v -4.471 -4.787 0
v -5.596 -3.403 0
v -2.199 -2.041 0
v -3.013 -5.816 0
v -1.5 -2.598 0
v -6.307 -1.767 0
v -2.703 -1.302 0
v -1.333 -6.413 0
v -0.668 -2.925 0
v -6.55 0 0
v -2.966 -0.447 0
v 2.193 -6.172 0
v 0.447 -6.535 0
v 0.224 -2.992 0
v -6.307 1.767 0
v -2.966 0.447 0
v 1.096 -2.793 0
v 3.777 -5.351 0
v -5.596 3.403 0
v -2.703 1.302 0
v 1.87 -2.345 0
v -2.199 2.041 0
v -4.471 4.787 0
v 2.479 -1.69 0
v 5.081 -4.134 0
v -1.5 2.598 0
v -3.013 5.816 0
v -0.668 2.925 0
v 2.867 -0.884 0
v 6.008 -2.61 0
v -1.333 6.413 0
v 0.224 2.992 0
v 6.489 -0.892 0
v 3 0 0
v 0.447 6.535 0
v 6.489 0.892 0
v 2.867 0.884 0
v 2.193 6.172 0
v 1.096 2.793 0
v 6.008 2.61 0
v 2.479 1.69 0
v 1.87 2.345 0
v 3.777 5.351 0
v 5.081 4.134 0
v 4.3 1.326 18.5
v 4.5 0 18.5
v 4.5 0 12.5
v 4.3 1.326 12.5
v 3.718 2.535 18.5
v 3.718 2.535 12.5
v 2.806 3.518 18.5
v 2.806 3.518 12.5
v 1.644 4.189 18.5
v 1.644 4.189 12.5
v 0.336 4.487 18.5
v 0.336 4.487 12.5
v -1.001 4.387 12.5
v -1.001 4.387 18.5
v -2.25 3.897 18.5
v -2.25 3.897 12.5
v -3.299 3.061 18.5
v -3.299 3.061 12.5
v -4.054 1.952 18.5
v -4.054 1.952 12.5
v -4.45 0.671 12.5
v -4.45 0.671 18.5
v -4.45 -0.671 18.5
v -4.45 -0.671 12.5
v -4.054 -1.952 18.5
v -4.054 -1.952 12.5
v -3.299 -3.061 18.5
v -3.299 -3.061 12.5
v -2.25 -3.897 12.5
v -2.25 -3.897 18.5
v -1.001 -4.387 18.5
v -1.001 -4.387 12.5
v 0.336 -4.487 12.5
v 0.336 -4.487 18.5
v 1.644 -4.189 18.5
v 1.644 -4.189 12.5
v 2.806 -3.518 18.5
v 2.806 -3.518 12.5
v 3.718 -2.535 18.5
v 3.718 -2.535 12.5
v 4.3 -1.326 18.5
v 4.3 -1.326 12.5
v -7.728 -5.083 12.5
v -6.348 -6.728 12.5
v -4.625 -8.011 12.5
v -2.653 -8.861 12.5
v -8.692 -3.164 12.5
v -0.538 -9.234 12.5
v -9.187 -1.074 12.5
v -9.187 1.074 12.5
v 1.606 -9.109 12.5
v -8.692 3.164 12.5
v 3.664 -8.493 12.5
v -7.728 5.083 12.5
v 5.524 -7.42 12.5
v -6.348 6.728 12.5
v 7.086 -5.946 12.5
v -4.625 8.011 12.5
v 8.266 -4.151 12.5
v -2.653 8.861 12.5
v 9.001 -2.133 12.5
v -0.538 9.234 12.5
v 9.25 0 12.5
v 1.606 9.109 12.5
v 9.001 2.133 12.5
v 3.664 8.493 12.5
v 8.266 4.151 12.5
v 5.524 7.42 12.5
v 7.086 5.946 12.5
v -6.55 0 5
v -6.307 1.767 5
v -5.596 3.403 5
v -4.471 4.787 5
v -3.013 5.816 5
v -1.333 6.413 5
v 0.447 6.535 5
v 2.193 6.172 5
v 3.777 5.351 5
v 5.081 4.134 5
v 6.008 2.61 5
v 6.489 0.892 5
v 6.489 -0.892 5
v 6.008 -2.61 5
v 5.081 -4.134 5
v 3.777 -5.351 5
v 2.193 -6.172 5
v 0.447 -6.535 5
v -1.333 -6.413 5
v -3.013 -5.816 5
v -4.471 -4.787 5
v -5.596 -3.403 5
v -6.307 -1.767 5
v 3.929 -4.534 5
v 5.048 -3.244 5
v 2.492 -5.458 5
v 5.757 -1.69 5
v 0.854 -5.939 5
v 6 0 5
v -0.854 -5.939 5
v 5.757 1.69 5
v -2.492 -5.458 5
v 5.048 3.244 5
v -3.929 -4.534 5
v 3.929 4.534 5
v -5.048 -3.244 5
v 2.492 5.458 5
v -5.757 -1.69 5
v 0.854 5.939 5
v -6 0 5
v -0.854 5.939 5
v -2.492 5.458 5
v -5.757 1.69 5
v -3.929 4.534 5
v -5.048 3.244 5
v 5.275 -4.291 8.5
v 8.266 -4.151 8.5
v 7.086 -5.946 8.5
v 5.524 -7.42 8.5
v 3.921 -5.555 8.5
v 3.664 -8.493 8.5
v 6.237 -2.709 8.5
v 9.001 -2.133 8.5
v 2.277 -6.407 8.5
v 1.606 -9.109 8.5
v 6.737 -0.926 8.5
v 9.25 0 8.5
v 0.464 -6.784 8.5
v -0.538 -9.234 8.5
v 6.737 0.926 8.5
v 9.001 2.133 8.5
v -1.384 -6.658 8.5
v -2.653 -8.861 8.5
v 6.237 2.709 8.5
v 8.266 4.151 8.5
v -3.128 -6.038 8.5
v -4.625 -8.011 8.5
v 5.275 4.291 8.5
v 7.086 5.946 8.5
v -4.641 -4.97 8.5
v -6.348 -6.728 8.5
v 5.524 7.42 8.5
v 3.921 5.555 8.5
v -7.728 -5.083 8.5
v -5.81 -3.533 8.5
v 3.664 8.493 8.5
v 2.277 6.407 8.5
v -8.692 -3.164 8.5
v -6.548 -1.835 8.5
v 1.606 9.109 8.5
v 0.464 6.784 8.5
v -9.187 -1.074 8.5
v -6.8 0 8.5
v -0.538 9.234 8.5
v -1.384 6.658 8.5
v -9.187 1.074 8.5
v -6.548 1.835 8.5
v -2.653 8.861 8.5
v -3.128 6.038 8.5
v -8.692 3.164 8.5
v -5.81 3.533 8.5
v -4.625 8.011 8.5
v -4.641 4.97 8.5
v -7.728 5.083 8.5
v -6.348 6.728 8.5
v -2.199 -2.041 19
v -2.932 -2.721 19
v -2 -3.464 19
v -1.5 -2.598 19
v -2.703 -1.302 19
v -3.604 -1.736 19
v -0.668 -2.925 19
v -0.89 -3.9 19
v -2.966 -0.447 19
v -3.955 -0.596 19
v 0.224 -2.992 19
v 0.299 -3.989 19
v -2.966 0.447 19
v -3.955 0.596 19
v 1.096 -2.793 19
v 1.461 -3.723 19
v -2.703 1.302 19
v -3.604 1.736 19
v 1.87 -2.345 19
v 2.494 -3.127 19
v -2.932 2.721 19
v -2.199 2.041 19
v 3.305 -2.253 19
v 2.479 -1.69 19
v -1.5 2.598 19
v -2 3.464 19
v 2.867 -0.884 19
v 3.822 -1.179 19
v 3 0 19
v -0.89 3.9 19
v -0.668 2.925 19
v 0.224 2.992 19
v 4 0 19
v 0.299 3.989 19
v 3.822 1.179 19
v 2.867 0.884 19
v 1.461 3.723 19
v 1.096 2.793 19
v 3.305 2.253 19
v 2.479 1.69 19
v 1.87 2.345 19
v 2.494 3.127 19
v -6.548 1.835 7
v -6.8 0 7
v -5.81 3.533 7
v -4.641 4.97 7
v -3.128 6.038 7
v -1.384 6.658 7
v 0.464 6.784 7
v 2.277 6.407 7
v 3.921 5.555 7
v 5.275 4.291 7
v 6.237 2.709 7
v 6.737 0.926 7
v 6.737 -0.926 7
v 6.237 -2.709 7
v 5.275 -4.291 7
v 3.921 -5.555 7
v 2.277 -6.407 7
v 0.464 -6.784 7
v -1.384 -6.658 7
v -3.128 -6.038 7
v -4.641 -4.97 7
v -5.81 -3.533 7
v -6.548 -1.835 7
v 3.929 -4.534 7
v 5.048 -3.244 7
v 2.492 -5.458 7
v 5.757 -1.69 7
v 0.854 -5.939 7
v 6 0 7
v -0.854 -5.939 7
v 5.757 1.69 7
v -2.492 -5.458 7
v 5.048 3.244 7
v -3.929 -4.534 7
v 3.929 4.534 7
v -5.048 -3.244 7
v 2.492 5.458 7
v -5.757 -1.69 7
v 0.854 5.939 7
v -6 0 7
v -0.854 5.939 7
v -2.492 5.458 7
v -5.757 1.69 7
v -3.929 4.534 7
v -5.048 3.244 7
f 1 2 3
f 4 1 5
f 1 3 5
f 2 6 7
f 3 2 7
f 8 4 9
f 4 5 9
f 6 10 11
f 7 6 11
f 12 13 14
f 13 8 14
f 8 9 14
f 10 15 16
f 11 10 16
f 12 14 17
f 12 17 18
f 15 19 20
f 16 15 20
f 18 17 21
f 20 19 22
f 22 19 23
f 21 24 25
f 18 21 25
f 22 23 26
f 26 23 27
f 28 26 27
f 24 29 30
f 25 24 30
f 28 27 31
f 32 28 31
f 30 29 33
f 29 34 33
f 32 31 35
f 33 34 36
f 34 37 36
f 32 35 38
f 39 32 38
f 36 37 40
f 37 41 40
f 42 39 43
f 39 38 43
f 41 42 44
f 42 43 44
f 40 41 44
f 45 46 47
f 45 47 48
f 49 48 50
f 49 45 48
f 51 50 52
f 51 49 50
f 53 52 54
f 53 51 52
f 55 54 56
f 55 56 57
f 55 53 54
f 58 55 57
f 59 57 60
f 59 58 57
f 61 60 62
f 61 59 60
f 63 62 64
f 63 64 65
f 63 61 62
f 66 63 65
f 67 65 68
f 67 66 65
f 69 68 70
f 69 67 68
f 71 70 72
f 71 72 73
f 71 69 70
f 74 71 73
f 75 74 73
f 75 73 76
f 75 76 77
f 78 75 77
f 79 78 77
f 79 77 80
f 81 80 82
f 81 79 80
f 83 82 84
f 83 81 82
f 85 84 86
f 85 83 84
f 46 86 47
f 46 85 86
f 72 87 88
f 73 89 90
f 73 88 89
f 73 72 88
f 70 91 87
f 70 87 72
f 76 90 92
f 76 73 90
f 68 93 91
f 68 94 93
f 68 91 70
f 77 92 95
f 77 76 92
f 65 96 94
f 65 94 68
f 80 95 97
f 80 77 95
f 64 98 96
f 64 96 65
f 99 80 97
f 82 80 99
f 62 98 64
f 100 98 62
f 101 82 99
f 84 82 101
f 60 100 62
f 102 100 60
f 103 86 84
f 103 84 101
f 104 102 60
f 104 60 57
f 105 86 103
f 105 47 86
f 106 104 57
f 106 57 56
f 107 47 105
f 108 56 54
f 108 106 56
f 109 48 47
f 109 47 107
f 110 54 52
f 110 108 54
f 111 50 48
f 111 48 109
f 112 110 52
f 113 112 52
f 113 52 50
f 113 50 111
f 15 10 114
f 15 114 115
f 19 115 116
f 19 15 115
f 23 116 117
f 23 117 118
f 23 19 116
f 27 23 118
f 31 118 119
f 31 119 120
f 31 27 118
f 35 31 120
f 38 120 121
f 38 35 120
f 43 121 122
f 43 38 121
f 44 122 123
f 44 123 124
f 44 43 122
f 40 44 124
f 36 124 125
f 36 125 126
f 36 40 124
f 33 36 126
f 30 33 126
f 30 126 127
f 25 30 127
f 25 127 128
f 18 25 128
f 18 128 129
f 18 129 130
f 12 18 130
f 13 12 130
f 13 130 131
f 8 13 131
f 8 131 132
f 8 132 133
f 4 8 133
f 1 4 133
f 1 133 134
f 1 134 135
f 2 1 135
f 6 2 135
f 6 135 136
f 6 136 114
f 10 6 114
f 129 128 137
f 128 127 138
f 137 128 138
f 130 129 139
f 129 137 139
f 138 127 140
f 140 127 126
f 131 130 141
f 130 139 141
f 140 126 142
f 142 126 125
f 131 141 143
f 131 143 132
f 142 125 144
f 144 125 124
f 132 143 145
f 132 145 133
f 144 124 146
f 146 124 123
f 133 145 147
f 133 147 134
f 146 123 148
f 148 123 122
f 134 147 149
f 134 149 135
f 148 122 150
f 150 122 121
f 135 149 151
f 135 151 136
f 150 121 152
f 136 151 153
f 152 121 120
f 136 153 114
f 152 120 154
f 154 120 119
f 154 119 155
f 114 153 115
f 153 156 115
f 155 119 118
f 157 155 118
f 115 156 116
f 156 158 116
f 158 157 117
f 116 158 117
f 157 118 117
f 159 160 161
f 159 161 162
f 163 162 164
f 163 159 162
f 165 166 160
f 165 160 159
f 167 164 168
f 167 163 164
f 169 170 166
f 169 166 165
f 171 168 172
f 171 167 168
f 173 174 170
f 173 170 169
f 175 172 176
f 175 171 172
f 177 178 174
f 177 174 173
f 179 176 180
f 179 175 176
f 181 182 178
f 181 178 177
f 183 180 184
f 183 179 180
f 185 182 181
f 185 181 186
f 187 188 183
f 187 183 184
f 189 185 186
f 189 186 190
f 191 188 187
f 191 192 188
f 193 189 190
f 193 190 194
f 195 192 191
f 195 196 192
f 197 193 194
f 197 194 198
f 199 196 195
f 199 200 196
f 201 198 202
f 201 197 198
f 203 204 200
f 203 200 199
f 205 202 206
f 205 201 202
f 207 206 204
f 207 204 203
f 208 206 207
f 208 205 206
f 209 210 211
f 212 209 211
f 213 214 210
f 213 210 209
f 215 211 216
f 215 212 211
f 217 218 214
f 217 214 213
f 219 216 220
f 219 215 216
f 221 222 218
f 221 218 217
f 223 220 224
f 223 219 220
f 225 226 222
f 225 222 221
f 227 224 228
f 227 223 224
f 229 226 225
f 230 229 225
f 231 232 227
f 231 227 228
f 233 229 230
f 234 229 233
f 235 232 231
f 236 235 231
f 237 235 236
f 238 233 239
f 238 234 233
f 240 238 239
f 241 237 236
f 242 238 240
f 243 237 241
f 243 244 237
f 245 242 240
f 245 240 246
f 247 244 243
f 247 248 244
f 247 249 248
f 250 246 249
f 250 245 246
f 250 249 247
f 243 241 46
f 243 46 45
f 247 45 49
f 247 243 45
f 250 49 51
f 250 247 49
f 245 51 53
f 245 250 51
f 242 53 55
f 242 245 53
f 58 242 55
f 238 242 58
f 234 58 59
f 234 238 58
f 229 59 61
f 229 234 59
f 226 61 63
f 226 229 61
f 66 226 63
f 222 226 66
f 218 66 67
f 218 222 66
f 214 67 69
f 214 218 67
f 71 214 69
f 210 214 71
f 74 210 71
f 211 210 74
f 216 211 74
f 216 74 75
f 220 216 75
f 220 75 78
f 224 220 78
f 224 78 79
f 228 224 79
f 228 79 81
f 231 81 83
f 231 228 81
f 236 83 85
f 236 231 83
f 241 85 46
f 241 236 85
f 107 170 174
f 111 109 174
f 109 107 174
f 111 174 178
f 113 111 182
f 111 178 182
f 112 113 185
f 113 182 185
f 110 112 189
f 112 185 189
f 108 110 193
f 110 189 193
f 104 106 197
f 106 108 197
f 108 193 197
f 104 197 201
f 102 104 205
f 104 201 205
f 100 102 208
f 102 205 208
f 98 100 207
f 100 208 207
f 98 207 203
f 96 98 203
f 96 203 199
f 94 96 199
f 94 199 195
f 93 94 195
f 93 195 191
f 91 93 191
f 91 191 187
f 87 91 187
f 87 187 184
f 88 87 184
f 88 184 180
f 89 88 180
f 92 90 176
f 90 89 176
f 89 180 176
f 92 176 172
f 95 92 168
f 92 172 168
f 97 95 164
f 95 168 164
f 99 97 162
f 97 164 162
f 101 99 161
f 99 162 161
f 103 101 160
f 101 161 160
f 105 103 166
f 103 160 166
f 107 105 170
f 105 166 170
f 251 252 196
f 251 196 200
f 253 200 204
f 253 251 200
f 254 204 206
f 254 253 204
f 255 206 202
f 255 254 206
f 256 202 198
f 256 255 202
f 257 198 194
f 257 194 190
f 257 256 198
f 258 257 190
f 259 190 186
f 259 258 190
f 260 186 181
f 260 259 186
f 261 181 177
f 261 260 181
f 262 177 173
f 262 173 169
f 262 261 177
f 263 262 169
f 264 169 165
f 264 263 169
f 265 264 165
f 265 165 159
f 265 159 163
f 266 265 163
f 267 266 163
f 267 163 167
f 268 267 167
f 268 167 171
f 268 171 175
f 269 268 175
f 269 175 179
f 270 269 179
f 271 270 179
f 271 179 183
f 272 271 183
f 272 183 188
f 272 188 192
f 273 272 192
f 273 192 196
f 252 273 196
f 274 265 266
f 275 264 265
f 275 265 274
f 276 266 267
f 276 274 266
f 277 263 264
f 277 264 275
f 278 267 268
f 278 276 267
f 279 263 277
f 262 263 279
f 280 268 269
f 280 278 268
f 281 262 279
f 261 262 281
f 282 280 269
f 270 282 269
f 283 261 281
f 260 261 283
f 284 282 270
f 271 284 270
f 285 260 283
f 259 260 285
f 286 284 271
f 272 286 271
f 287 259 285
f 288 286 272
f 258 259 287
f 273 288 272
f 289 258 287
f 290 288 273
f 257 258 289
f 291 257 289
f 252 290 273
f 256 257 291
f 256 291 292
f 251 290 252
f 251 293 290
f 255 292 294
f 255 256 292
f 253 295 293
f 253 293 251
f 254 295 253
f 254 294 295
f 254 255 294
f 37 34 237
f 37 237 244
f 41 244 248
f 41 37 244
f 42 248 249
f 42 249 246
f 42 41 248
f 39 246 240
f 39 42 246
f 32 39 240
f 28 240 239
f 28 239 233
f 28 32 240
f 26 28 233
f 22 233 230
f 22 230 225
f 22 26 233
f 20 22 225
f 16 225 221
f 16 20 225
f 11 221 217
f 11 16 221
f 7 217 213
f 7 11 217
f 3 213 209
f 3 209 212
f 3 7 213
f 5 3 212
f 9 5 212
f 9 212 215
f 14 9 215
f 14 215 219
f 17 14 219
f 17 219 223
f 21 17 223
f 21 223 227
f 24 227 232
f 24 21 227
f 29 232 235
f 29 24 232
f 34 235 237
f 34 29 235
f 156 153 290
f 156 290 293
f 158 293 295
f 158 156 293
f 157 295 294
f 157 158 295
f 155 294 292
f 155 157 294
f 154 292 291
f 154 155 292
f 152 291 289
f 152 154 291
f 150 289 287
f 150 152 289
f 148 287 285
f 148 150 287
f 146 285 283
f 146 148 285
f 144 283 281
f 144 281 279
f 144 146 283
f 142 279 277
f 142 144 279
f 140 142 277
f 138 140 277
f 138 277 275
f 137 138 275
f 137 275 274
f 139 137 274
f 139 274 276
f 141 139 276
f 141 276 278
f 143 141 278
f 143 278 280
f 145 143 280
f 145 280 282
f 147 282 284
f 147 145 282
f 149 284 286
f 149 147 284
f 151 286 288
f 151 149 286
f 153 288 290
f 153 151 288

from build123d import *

# Parameters (mm, degrees)
SKETCH1_R           = 9.25
SKETCH1_R_2         = 3
BOSS_EXTRUDE1_DEPTH = 19
SKETCH2_OUTSIDE_W   = 26.966
SKETCH2_OUTSIDE_H   = 26.966
SKETCH2_OUTSIDE_R   = 4.5
CUT_EXTRUDE1_DEPTH  = 6.5
SKETCH3_OUTSIDE_W   = 26.966
SKETCH3_OUTSIDE_H   = 26.966
SKETCH3_OUTSIDE_R   = 6.8
CUT_EXTRUDE2_DEPTH  = 8.5
SKETCH4_OUTSIDE_W   = 26.966
SKETCH4_OUTSIDE_H   = 26.966
SKETCH4_OUTSIDE_R   = 6.55
CUT_EXTRUDE3_DEPTH  = 7
CHAMFER1_SIZE       = 0.5
CUT_EXTRUDE4_START  = -5
SKETCH5_OUTSIDE_W   = 26.966
SKETCH5_OUTSIDE_H   = 26.966
SKETCH5_OUTSIDE_R   = 6
CUT_EXTRUDE4_DEPTH  = 2


with BuildPart() as part:
    # Sketch1 → Boss-Extrude1 (new body)
    with BuildSketch(Plane.XY):
        Circle(SKETCH1_R)
        Circle(SKETCH1_R_2, mode=Mode.SUBTRACT)
    extrude(amount=BOSS_EXTRUDE1_DEPTH)

    # Sketch2 outside → Cut-Extrude1 (cut)
    with BuildSketch(Plane.XY.offset(19)):
        Rectangle(SKETCH2_OUTSIDE_W, SKETCH2_OUTSIDE_H)
        Circle(SKETCH2_OUTSIDE_R, mode=Mode.SUBTRACT)
    extrude(amount=-CUT_EXTRUDE1_DEPTH, mode=Mode.SUBTRACT)

    # Sketch3 outside → Cut-Extrude2 (cut)
    with BuildSketch(Plane(origin=(0, 0, 0), x_dir=(-1, 0, 0), z_dir=(0, 0, -1))):
        Rectangle(SKETCH3_OUTSIDE_W, SKETCH3_OUTSIDE_H)
        Circle(SKETCH3_OUTSIDE_R, mode=Mode.SUBTRACT)
    extrude(amount=-CUT_EXTRUDE2_DEPTH, mode=Mode.SUBTRACT)

    # Sketch4 outside → Cut-Extrude3 (cut)
    with BuildSketch(Plane(origin=(0, 0, 0), x_dir=(-1, 0, 0), z_dir=(0, 0, -1))):
        Rectangle(SKETCH4_OUTSIDE_W, SKETCH4_OUTSIDE_H)
        Circle(SKETCH4_OUTSIDE_R, mode=Mode.SUBTRACT)
    extrude(amount=-CUT_EXTRUDE3_DEPTH, mode=Mode.SUBTRACT)

    # Chamfer1
    chamfer1_edges = [part.edges().sort_by_distance(p)[0] for p in [
        (-4.5, 0, 19),
    ]]
    chamfer(chamfer1_edges, length=CHAMFER1_SIZE)

    # Sketch5 outside → Cut-Extrude4 (cut)
    with BuildSketch(Plane(origin=(0, 0, 0), x_dir=(-1, 0, 0), z_dir=(0, 0, -1)).offset(CUT_EXTRUDE4_START)):
        Rectangle(SKETCH5_OUTSIDE_W, SKETCH5_OUTSIDE_H)
        Circle(SKETCH5_OUTSIDE_R, mode=Mode.SUBTRACT)
    extrude(amount=-CUT_EXTRUDE4_DEPTH, mode=Mode.SUBTRACT)


solid = part.part
